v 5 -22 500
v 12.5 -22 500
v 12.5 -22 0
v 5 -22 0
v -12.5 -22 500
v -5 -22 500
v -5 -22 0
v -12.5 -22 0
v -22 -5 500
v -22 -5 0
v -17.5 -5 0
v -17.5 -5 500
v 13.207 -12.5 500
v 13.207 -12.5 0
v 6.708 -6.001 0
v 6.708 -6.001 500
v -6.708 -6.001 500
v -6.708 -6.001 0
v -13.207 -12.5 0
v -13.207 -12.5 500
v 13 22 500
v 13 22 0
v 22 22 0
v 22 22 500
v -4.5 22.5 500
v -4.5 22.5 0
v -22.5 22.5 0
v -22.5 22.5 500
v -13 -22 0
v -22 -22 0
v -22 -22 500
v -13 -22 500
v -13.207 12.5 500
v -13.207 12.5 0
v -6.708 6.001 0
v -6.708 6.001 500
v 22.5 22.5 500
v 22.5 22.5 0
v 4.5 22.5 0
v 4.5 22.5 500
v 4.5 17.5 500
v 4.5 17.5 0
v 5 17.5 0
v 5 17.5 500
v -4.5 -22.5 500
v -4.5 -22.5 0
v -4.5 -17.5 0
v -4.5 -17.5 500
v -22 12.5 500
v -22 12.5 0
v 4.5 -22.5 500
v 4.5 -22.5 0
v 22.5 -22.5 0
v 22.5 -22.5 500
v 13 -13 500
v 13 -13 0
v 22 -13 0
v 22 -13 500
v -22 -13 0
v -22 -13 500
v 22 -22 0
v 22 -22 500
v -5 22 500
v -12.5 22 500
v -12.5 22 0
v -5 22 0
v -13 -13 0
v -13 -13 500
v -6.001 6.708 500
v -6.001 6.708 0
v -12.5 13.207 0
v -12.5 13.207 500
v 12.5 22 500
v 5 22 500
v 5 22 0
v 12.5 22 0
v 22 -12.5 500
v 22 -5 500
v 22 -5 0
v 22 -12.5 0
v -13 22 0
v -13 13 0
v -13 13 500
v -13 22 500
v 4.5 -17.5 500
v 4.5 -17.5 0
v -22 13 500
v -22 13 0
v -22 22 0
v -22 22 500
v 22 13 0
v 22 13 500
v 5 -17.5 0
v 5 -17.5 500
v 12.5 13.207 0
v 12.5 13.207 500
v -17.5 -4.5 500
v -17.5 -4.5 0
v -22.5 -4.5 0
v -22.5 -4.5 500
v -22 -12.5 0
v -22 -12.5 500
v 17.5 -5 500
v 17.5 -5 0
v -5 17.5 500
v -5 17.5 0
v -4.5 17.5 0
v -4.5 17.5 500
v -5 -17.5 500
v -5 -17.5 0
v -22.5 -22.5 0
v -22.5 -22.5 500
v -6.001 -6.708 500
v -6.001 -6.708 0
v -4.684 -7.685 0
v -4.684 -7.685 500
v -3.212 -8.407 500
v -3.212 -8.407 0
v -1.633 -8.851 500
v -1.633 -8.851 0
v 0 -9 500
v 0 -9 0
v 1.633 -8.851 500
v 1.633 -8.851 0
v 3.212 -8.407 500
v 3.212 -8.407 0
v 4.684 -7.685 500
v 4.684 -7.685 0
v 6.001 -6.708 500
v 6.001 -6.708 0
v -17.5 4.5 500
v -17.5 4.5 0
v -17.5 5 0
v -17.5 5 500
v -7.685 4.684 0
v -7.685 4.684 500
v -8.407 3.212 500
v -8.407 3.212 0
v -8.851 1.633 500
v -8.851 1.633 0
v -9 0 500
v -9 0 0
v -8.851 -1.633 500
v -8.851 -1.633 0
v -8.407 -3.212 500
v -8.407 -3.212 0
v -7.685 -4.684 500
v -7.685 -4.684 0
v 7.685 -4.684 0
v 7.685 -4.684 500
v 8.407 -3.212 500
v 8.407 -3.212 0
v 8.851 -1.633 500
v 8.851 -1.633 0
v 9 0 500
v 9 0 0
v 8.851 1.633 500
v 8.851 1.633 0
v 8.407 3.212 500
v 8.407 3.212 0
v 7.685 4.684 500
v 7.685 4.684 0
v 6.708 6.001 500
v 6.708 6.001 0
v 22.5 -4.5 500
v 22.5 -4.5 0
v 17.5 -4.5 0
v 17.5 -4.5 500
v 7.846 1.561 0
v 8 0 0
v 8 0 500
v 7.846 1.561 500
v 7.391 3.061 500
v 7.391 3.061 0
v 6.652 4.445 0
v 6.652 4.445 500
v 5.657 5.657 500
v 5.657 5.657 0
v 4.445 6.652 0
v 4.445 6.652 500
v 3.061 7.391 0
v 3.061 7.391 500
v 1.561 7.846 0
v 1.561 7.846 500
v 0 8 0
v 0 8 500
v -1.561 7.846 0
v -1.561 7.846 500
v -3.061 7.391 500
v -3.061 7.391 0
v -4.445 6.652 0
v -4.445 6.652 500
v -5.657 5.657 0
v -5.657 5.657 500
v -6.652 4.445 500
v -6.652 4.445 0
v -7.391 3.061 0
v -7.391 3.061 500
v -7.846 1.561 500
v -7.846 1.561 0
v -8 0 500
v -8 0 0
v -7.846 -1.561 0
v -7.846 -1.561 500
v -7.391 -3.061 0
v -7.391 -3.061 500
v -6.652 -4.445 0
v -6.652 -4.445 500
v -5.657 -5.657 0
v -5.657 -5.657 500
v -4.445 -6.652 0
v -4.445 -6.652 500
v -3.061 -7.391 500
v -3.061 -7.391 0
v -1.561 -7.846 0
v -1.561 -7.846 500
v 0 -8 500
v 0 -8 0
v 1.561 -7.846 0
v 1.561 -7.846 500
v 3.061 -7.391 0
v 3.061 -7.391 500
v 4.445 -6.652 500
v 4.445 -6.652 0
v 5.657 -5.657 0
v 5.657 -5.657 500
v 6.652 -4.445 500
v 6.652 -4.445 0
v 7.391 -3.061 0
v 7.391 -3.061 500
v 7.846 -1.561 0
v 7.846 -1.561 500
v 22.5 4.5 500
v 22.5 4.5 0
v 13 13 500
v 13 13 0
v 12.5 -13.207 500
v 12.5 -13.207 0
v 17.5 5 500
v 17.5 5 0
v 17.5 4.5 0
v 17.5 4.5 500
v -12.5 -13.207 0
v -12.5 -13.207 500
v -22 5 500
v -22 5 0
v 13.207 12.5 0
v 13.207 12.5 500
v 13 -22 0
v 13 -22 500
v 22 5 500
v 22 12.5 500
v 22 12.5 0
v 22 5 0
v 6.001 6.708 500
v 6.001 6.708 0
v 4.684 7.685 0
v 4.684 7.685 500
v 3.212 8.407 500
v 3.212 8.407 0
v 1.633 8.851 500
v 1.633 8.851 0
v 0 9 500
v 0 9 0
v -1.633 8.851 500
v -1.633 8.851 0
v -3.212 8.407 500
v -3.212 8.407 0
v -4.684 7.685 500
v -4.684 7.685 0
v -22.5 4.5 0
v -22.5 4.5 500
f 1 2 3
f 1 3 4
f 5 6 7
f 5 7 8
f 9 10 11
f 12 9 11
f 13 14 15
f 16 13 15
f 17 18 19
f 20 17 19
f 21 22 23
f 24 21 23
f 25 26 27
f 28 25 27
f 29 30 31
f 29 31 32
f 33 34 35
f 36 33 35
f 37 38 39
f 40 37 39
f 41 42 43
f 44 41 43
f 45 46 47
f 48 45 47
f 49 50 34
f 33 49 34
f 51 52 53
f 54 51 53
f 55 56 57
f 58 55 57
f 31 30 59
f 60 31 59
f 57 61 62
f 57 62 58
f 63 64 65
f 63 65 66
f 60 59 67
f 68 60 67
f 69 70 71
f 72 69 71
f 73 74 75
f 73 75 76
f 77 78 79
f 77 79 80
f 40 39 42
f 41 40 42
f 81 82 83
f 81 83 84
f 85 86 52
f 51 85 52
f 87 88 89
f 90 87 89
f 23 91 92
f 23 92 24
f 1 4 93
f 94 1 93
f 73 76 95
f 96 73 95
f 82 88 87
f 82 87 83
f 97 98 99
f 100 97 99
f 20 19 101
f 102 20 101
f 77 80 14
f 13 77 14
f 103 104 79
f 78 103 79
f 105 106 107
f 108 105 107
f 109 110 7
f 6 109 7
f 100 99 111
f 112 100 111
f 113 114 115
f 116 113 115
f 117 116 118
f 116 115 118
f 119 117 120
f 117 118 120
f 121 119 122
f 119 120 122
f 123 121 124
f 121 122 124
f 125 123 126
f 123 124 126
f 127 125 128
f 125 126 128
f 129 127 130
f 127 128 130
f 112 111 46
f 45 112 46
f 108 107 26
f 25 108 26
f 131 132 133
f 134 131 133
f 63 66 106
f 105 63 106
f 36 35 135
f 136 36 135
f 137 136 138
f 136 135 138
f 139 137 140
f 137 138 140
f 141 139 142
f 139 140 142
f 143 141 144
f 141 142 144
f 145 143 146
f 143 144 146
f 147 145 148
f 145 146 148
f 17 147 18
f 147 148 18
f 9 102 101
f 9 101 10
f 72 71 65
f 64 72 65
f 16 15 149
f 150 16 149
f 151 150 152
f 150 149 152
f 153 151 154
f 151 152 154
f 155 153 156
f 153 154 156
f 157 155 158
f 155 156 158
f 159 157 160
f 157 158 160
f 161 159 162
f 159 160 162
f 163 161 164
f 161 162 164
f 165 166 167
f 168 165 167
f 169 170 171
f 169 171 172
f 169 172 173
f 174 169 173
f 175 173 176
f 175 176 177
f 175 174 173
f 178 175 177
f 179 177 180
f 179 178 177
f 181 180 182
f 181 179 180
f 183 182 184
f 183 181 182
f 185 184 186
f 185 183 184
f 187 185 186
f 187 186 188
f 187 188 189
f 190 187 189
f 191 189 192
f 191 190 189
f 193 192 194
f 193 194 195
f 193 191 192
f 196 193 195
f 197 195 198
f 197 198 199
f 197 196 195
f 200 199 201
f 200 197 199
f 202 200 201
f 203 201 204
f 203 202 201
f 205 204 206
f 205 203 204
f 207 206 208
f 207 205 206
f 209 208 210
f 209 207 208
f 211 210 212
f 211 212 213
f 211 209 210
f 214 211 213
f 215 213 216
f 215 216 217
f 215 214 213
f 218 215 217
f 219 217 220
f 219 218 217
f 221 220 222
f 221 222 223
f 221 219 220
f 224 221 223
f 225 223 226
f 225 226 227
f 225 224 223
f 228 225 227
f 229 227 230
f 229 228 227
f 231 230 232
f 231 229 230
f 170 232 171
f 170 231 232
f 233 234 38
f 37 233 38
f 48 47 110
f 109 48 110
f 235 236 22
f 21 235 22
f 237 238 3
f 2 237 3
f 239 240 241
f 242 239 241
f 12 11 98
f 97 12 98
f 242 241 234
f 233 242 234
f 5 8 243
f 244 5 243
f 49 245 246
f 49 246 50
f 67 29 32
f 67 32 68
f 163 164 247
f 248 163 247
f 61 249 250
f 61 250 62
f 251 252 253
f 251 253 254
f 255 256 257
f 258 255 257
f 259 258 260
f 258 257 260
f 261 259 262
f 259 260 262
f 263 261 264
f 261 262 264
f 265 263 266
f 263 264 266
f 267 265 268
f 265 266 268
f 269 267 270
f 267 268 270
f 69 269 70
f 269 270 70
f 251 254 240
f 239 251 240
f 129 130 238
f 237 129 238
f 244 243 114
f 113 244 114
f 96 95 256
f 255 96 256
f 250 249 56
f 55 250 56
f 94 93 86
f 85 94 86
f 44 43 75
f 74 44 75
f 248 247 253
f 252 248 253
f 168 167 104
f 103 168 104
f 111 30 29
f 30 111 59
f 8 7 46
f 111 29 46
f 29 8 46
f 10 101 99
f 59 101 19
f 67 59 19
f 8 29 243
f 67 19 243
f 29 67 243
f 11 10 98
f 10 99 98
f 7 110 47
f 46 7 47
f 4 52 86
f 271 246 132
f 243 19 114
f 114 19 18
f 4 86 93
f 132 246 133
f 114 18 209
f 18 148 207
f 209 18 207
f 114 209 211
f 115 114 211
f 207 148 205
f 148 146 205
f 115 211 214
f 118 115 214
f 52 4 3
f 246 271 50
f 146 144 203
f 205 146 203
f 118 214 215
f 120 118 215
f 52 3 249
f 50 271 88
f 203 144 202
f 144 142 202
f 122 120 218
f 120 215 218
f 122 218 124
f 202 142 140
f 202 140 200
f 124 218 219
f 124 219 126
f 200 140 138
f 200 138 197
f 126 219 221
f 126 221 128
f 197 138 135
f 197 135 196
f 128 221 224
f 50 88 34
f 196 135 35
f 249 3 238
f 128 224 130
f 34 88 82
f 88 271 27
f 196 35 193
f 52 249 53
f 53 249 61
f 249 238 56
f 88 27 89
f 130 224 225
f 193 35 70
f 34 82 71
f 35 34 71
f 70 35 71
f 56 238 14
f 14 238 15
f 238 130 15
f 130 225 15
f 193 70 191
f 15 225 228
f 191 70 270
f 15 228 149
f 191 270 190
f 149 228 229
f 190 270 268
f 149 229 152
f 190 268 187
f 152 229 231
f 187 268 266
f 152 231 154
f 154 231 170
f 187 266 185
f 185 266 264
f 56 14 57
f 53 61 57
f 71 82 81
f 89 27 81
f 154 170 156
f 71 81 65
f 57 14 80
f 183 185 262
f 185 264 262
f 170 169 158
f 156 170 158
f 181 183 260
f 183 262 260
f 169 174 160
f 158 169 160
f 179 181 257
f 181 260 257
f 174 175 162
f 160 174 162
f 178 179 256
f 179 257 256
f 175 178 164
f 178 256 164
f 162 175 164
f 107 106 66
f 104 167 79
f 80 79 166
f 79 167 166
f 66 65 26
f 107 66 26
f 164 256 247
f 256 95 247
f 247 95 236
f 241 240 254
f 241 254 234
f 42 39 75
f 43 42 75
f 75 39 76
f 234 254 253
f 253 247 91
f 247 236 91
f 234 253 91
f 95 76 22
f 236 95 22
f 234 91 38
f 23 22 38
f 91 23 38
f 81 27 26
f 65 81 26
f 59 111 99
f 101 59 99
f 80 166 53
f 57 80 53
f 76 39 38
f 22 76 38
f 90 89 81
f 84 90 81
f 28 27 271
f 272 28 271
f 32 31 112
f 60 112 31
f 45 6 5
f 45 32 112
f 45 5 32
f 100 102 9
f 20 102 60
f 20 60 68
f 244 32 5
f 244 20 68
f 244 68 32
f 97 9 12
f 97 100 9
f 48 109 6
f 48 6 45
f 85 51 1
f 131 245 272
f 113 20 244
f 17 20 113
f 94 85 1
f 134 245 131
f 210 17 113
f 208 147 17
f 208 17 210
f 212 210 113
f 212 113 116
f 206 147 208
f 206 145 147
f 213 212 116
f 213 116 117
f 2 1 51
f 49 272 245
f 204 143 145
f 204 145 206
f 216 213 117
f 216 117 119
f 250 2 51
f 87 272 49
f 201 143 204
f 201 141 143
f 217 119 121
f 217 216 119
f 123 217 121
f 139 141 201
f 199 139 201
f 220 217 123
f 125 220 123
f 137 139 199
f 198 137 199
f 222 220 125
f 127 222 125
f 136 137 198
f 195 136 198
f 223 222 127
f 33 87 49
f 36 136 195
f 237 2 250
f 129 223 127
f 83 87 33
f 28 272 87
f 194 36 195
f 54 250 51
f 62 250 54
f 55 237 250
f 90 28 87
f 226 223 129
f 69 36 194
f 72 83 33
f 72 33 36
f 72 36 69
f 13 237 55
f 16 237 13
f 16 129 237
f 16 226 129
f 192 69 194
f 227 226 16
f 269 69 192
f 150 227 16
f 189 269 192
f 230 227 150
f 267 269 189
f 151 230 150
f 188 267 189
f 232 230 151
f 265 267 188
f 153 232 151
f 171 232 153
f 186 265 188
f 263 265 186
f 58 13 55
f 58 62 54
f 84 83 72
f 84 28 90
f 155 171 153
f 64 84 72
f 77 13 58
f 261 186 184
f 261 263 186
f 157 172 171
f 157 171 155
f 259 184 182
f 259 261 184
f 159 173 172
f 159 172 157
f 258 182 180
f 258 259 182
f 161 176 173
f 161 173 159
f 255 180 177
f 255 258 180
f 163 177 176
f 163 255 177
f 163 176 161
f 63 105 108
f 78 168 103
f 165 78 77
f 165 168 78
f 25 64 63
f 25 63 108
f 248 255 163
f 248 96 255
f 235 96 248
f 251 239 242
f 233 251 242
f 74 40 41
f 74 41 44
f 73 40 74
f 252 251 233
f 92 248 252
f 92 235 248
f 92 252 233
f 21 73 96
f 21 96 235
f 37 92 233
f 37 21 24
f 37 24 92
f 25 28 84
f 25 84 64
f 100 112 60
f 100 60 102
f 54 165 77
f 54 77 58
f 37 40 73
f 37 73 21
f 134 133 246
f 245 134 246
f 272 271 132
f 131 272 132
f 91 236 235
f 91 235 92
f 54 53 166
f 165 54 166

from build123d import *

# Parameters (mm, degrees)
ESBO_O1_W                = 9
ESBO_O1_H                = 9
ESBO_O1_R                = 8
RESSALTO_EXTRUS_O4_DEPTH = 500


with BuildPart() as part:
    # Esboço1 → Ressalto-extrusão4 (new body)
    with BuildSketch(Plane.XY):
        with BuildLine():
            Line((-4.5, 22.5), (-22.5, 22.5))
            Line((-22.5, 22.5), (-22.5, 4.5))
            Line((-22.5, 4.5), (-17.5, 4.5))
            Line((-17.5, 4.5), (-17.5, 5))
            Line((-17.5, 5), (-22, 5))
            Line((-22, 5), (-22, 12.5))
            Line((-22, 12.5), (-13.207106781, 12.5))
            Line((-13.207106781, 12.5), (-6.707685904, 6.000579123))
            ThreePointArc((-6.707685904, 6.000579123), (-9, 0), (-6.707685904, -6.000579123))
            Line((-6.707685904, -6.000579123), (-13.207106781, -12.5))
            Line((-13.207106781, -12.5), (-22, -12.5))
            Line((-22, -12.5), (-22, -5))
            Line((-22, -5), (-17.5, -5))
            Line((-17.5, -5), (-17.5, -4.5))
            Line((-17.5, -4.5), (-22.5, -4.5))
            Line((-22.5, -4.5), (-22.5, -22.5))
            Line((-22.5, -22.5), (-4.5, -22.5))
            Line((-4.5, -22.5), (-4.5, -17.5))
            Line((-4.5, -17.5), (-5, -17.5))
            Line((-5, -17.5), (-5, -22))
            Line((-5, -22), (-12.5, -22))
            Line((-12.5, -22), (-12.5, -13.207106781))
            Line((-12.5, -13.207106781), (-6.000579123, -6.707685904))
            ThreePointArc((-6.000579123, -6.707685904), (0, -9), (6.000579123, -6.707685904))
            Line((6.000579123, -6.707685904), (12.5, -13.207106781))
            Line((12.5, -13.207106781), (12.5, -22))
            Line((12.5, -22), (5, -22))
            Line((5, -22), (5, -17.5))
            Line((5, -17.5), (4.5, -17.5))
            Line((4.5, -17.5), (4.5, -22.5))
            Line((4.5, -22.5), (22.5, -22.5))
            Line((22.5, -22.5), (22.5, -4.5))
            Line((22.5, -4.5), (17.5, -4.5))
            Line((17.5, -4.5), (17.5, -5))
            Line((17.5, -5), (22, -5))
            Line((22, -5), (22, -12.5))
            Line((22, -12.5), (13.207106781, -12.5))
            Line((13.207106781, -12.5), (6.707685904, -6.000579123))
            ThreePointArc((6.707685904, -6.000579123), (9, 0), (6.707685904, 6.000579123))
            Line((6.707685904, 6.000579123), (13.207106781, 12.5))
            Line((13.207106781, 12.5), (22, 12.5))
            Line((22, 12.5), (22, 5))
            Line((22, 5), (17.5, 5))
            Line((17.5, 5), (17.5, 4.5))
            Line((17.5, 4.5), (22.5, 4.5))
            Line((22.5, 4.5), (22.5, 22.5))
            Line((22.5, 22.5), (4.5, 22.5))
            Line((4.5, 22.5), (4.5, 17.5))
            Line((4.5, 17.5), (5, 17.5))
            Line((5, 17.5), (5, 22))
            Line((5, 22), (12.5, 22))
            Line((12.5, 22), (12.5, 13.207106781))
            Line((12.5, 13.207106781), (6.000579123, 6.707685904))
            ThreePointArc((6.000579123, 6.707685904), (0, 9), (-6.000579123, 6.707685904))
            Line((-6.000579123, 6.707685904), (-12.5, 13.207106781))
            Line((-12.5, 13.207106781), (-12.5, 22))
            Line((-12.5, 22), (-5, 22))
            Line((-5, 22), (-5, 17.5))
            Line((-5, 17.5), (-4.5, 17.5))
            Line((-4.5, 17.5), (-4.5, 22.5))
        make_face()
        with Locations((17.5, 17.5)):
            Rectangle(ESBO_O1_W, ESBO_O1_H, mode=Mode.SUBTRACT)
        with Locations((-17.5, -17.5)):
            Rectangle(ESBO_O1_W, ESBO_O1_H, mode=Mode.SUBTRACT)
        with Locations((17.5, -17.5)):
            Rectangle(ESBO_O1_W, ESBO_O1_H, mode=Mode.SUBTRACT)
        with Locations((-17.5, 17.5)):
            Rectangle(ESBO_O1_W, ESBO_O1_H, mode=Mode.SUBTRACT)
        Circle(ESBO_O1_R, mode=Mode.SUBTRACT)
    extrude(amount=RESSALTO_EXTRUS_O4_DEPTH)


solid = part.part
